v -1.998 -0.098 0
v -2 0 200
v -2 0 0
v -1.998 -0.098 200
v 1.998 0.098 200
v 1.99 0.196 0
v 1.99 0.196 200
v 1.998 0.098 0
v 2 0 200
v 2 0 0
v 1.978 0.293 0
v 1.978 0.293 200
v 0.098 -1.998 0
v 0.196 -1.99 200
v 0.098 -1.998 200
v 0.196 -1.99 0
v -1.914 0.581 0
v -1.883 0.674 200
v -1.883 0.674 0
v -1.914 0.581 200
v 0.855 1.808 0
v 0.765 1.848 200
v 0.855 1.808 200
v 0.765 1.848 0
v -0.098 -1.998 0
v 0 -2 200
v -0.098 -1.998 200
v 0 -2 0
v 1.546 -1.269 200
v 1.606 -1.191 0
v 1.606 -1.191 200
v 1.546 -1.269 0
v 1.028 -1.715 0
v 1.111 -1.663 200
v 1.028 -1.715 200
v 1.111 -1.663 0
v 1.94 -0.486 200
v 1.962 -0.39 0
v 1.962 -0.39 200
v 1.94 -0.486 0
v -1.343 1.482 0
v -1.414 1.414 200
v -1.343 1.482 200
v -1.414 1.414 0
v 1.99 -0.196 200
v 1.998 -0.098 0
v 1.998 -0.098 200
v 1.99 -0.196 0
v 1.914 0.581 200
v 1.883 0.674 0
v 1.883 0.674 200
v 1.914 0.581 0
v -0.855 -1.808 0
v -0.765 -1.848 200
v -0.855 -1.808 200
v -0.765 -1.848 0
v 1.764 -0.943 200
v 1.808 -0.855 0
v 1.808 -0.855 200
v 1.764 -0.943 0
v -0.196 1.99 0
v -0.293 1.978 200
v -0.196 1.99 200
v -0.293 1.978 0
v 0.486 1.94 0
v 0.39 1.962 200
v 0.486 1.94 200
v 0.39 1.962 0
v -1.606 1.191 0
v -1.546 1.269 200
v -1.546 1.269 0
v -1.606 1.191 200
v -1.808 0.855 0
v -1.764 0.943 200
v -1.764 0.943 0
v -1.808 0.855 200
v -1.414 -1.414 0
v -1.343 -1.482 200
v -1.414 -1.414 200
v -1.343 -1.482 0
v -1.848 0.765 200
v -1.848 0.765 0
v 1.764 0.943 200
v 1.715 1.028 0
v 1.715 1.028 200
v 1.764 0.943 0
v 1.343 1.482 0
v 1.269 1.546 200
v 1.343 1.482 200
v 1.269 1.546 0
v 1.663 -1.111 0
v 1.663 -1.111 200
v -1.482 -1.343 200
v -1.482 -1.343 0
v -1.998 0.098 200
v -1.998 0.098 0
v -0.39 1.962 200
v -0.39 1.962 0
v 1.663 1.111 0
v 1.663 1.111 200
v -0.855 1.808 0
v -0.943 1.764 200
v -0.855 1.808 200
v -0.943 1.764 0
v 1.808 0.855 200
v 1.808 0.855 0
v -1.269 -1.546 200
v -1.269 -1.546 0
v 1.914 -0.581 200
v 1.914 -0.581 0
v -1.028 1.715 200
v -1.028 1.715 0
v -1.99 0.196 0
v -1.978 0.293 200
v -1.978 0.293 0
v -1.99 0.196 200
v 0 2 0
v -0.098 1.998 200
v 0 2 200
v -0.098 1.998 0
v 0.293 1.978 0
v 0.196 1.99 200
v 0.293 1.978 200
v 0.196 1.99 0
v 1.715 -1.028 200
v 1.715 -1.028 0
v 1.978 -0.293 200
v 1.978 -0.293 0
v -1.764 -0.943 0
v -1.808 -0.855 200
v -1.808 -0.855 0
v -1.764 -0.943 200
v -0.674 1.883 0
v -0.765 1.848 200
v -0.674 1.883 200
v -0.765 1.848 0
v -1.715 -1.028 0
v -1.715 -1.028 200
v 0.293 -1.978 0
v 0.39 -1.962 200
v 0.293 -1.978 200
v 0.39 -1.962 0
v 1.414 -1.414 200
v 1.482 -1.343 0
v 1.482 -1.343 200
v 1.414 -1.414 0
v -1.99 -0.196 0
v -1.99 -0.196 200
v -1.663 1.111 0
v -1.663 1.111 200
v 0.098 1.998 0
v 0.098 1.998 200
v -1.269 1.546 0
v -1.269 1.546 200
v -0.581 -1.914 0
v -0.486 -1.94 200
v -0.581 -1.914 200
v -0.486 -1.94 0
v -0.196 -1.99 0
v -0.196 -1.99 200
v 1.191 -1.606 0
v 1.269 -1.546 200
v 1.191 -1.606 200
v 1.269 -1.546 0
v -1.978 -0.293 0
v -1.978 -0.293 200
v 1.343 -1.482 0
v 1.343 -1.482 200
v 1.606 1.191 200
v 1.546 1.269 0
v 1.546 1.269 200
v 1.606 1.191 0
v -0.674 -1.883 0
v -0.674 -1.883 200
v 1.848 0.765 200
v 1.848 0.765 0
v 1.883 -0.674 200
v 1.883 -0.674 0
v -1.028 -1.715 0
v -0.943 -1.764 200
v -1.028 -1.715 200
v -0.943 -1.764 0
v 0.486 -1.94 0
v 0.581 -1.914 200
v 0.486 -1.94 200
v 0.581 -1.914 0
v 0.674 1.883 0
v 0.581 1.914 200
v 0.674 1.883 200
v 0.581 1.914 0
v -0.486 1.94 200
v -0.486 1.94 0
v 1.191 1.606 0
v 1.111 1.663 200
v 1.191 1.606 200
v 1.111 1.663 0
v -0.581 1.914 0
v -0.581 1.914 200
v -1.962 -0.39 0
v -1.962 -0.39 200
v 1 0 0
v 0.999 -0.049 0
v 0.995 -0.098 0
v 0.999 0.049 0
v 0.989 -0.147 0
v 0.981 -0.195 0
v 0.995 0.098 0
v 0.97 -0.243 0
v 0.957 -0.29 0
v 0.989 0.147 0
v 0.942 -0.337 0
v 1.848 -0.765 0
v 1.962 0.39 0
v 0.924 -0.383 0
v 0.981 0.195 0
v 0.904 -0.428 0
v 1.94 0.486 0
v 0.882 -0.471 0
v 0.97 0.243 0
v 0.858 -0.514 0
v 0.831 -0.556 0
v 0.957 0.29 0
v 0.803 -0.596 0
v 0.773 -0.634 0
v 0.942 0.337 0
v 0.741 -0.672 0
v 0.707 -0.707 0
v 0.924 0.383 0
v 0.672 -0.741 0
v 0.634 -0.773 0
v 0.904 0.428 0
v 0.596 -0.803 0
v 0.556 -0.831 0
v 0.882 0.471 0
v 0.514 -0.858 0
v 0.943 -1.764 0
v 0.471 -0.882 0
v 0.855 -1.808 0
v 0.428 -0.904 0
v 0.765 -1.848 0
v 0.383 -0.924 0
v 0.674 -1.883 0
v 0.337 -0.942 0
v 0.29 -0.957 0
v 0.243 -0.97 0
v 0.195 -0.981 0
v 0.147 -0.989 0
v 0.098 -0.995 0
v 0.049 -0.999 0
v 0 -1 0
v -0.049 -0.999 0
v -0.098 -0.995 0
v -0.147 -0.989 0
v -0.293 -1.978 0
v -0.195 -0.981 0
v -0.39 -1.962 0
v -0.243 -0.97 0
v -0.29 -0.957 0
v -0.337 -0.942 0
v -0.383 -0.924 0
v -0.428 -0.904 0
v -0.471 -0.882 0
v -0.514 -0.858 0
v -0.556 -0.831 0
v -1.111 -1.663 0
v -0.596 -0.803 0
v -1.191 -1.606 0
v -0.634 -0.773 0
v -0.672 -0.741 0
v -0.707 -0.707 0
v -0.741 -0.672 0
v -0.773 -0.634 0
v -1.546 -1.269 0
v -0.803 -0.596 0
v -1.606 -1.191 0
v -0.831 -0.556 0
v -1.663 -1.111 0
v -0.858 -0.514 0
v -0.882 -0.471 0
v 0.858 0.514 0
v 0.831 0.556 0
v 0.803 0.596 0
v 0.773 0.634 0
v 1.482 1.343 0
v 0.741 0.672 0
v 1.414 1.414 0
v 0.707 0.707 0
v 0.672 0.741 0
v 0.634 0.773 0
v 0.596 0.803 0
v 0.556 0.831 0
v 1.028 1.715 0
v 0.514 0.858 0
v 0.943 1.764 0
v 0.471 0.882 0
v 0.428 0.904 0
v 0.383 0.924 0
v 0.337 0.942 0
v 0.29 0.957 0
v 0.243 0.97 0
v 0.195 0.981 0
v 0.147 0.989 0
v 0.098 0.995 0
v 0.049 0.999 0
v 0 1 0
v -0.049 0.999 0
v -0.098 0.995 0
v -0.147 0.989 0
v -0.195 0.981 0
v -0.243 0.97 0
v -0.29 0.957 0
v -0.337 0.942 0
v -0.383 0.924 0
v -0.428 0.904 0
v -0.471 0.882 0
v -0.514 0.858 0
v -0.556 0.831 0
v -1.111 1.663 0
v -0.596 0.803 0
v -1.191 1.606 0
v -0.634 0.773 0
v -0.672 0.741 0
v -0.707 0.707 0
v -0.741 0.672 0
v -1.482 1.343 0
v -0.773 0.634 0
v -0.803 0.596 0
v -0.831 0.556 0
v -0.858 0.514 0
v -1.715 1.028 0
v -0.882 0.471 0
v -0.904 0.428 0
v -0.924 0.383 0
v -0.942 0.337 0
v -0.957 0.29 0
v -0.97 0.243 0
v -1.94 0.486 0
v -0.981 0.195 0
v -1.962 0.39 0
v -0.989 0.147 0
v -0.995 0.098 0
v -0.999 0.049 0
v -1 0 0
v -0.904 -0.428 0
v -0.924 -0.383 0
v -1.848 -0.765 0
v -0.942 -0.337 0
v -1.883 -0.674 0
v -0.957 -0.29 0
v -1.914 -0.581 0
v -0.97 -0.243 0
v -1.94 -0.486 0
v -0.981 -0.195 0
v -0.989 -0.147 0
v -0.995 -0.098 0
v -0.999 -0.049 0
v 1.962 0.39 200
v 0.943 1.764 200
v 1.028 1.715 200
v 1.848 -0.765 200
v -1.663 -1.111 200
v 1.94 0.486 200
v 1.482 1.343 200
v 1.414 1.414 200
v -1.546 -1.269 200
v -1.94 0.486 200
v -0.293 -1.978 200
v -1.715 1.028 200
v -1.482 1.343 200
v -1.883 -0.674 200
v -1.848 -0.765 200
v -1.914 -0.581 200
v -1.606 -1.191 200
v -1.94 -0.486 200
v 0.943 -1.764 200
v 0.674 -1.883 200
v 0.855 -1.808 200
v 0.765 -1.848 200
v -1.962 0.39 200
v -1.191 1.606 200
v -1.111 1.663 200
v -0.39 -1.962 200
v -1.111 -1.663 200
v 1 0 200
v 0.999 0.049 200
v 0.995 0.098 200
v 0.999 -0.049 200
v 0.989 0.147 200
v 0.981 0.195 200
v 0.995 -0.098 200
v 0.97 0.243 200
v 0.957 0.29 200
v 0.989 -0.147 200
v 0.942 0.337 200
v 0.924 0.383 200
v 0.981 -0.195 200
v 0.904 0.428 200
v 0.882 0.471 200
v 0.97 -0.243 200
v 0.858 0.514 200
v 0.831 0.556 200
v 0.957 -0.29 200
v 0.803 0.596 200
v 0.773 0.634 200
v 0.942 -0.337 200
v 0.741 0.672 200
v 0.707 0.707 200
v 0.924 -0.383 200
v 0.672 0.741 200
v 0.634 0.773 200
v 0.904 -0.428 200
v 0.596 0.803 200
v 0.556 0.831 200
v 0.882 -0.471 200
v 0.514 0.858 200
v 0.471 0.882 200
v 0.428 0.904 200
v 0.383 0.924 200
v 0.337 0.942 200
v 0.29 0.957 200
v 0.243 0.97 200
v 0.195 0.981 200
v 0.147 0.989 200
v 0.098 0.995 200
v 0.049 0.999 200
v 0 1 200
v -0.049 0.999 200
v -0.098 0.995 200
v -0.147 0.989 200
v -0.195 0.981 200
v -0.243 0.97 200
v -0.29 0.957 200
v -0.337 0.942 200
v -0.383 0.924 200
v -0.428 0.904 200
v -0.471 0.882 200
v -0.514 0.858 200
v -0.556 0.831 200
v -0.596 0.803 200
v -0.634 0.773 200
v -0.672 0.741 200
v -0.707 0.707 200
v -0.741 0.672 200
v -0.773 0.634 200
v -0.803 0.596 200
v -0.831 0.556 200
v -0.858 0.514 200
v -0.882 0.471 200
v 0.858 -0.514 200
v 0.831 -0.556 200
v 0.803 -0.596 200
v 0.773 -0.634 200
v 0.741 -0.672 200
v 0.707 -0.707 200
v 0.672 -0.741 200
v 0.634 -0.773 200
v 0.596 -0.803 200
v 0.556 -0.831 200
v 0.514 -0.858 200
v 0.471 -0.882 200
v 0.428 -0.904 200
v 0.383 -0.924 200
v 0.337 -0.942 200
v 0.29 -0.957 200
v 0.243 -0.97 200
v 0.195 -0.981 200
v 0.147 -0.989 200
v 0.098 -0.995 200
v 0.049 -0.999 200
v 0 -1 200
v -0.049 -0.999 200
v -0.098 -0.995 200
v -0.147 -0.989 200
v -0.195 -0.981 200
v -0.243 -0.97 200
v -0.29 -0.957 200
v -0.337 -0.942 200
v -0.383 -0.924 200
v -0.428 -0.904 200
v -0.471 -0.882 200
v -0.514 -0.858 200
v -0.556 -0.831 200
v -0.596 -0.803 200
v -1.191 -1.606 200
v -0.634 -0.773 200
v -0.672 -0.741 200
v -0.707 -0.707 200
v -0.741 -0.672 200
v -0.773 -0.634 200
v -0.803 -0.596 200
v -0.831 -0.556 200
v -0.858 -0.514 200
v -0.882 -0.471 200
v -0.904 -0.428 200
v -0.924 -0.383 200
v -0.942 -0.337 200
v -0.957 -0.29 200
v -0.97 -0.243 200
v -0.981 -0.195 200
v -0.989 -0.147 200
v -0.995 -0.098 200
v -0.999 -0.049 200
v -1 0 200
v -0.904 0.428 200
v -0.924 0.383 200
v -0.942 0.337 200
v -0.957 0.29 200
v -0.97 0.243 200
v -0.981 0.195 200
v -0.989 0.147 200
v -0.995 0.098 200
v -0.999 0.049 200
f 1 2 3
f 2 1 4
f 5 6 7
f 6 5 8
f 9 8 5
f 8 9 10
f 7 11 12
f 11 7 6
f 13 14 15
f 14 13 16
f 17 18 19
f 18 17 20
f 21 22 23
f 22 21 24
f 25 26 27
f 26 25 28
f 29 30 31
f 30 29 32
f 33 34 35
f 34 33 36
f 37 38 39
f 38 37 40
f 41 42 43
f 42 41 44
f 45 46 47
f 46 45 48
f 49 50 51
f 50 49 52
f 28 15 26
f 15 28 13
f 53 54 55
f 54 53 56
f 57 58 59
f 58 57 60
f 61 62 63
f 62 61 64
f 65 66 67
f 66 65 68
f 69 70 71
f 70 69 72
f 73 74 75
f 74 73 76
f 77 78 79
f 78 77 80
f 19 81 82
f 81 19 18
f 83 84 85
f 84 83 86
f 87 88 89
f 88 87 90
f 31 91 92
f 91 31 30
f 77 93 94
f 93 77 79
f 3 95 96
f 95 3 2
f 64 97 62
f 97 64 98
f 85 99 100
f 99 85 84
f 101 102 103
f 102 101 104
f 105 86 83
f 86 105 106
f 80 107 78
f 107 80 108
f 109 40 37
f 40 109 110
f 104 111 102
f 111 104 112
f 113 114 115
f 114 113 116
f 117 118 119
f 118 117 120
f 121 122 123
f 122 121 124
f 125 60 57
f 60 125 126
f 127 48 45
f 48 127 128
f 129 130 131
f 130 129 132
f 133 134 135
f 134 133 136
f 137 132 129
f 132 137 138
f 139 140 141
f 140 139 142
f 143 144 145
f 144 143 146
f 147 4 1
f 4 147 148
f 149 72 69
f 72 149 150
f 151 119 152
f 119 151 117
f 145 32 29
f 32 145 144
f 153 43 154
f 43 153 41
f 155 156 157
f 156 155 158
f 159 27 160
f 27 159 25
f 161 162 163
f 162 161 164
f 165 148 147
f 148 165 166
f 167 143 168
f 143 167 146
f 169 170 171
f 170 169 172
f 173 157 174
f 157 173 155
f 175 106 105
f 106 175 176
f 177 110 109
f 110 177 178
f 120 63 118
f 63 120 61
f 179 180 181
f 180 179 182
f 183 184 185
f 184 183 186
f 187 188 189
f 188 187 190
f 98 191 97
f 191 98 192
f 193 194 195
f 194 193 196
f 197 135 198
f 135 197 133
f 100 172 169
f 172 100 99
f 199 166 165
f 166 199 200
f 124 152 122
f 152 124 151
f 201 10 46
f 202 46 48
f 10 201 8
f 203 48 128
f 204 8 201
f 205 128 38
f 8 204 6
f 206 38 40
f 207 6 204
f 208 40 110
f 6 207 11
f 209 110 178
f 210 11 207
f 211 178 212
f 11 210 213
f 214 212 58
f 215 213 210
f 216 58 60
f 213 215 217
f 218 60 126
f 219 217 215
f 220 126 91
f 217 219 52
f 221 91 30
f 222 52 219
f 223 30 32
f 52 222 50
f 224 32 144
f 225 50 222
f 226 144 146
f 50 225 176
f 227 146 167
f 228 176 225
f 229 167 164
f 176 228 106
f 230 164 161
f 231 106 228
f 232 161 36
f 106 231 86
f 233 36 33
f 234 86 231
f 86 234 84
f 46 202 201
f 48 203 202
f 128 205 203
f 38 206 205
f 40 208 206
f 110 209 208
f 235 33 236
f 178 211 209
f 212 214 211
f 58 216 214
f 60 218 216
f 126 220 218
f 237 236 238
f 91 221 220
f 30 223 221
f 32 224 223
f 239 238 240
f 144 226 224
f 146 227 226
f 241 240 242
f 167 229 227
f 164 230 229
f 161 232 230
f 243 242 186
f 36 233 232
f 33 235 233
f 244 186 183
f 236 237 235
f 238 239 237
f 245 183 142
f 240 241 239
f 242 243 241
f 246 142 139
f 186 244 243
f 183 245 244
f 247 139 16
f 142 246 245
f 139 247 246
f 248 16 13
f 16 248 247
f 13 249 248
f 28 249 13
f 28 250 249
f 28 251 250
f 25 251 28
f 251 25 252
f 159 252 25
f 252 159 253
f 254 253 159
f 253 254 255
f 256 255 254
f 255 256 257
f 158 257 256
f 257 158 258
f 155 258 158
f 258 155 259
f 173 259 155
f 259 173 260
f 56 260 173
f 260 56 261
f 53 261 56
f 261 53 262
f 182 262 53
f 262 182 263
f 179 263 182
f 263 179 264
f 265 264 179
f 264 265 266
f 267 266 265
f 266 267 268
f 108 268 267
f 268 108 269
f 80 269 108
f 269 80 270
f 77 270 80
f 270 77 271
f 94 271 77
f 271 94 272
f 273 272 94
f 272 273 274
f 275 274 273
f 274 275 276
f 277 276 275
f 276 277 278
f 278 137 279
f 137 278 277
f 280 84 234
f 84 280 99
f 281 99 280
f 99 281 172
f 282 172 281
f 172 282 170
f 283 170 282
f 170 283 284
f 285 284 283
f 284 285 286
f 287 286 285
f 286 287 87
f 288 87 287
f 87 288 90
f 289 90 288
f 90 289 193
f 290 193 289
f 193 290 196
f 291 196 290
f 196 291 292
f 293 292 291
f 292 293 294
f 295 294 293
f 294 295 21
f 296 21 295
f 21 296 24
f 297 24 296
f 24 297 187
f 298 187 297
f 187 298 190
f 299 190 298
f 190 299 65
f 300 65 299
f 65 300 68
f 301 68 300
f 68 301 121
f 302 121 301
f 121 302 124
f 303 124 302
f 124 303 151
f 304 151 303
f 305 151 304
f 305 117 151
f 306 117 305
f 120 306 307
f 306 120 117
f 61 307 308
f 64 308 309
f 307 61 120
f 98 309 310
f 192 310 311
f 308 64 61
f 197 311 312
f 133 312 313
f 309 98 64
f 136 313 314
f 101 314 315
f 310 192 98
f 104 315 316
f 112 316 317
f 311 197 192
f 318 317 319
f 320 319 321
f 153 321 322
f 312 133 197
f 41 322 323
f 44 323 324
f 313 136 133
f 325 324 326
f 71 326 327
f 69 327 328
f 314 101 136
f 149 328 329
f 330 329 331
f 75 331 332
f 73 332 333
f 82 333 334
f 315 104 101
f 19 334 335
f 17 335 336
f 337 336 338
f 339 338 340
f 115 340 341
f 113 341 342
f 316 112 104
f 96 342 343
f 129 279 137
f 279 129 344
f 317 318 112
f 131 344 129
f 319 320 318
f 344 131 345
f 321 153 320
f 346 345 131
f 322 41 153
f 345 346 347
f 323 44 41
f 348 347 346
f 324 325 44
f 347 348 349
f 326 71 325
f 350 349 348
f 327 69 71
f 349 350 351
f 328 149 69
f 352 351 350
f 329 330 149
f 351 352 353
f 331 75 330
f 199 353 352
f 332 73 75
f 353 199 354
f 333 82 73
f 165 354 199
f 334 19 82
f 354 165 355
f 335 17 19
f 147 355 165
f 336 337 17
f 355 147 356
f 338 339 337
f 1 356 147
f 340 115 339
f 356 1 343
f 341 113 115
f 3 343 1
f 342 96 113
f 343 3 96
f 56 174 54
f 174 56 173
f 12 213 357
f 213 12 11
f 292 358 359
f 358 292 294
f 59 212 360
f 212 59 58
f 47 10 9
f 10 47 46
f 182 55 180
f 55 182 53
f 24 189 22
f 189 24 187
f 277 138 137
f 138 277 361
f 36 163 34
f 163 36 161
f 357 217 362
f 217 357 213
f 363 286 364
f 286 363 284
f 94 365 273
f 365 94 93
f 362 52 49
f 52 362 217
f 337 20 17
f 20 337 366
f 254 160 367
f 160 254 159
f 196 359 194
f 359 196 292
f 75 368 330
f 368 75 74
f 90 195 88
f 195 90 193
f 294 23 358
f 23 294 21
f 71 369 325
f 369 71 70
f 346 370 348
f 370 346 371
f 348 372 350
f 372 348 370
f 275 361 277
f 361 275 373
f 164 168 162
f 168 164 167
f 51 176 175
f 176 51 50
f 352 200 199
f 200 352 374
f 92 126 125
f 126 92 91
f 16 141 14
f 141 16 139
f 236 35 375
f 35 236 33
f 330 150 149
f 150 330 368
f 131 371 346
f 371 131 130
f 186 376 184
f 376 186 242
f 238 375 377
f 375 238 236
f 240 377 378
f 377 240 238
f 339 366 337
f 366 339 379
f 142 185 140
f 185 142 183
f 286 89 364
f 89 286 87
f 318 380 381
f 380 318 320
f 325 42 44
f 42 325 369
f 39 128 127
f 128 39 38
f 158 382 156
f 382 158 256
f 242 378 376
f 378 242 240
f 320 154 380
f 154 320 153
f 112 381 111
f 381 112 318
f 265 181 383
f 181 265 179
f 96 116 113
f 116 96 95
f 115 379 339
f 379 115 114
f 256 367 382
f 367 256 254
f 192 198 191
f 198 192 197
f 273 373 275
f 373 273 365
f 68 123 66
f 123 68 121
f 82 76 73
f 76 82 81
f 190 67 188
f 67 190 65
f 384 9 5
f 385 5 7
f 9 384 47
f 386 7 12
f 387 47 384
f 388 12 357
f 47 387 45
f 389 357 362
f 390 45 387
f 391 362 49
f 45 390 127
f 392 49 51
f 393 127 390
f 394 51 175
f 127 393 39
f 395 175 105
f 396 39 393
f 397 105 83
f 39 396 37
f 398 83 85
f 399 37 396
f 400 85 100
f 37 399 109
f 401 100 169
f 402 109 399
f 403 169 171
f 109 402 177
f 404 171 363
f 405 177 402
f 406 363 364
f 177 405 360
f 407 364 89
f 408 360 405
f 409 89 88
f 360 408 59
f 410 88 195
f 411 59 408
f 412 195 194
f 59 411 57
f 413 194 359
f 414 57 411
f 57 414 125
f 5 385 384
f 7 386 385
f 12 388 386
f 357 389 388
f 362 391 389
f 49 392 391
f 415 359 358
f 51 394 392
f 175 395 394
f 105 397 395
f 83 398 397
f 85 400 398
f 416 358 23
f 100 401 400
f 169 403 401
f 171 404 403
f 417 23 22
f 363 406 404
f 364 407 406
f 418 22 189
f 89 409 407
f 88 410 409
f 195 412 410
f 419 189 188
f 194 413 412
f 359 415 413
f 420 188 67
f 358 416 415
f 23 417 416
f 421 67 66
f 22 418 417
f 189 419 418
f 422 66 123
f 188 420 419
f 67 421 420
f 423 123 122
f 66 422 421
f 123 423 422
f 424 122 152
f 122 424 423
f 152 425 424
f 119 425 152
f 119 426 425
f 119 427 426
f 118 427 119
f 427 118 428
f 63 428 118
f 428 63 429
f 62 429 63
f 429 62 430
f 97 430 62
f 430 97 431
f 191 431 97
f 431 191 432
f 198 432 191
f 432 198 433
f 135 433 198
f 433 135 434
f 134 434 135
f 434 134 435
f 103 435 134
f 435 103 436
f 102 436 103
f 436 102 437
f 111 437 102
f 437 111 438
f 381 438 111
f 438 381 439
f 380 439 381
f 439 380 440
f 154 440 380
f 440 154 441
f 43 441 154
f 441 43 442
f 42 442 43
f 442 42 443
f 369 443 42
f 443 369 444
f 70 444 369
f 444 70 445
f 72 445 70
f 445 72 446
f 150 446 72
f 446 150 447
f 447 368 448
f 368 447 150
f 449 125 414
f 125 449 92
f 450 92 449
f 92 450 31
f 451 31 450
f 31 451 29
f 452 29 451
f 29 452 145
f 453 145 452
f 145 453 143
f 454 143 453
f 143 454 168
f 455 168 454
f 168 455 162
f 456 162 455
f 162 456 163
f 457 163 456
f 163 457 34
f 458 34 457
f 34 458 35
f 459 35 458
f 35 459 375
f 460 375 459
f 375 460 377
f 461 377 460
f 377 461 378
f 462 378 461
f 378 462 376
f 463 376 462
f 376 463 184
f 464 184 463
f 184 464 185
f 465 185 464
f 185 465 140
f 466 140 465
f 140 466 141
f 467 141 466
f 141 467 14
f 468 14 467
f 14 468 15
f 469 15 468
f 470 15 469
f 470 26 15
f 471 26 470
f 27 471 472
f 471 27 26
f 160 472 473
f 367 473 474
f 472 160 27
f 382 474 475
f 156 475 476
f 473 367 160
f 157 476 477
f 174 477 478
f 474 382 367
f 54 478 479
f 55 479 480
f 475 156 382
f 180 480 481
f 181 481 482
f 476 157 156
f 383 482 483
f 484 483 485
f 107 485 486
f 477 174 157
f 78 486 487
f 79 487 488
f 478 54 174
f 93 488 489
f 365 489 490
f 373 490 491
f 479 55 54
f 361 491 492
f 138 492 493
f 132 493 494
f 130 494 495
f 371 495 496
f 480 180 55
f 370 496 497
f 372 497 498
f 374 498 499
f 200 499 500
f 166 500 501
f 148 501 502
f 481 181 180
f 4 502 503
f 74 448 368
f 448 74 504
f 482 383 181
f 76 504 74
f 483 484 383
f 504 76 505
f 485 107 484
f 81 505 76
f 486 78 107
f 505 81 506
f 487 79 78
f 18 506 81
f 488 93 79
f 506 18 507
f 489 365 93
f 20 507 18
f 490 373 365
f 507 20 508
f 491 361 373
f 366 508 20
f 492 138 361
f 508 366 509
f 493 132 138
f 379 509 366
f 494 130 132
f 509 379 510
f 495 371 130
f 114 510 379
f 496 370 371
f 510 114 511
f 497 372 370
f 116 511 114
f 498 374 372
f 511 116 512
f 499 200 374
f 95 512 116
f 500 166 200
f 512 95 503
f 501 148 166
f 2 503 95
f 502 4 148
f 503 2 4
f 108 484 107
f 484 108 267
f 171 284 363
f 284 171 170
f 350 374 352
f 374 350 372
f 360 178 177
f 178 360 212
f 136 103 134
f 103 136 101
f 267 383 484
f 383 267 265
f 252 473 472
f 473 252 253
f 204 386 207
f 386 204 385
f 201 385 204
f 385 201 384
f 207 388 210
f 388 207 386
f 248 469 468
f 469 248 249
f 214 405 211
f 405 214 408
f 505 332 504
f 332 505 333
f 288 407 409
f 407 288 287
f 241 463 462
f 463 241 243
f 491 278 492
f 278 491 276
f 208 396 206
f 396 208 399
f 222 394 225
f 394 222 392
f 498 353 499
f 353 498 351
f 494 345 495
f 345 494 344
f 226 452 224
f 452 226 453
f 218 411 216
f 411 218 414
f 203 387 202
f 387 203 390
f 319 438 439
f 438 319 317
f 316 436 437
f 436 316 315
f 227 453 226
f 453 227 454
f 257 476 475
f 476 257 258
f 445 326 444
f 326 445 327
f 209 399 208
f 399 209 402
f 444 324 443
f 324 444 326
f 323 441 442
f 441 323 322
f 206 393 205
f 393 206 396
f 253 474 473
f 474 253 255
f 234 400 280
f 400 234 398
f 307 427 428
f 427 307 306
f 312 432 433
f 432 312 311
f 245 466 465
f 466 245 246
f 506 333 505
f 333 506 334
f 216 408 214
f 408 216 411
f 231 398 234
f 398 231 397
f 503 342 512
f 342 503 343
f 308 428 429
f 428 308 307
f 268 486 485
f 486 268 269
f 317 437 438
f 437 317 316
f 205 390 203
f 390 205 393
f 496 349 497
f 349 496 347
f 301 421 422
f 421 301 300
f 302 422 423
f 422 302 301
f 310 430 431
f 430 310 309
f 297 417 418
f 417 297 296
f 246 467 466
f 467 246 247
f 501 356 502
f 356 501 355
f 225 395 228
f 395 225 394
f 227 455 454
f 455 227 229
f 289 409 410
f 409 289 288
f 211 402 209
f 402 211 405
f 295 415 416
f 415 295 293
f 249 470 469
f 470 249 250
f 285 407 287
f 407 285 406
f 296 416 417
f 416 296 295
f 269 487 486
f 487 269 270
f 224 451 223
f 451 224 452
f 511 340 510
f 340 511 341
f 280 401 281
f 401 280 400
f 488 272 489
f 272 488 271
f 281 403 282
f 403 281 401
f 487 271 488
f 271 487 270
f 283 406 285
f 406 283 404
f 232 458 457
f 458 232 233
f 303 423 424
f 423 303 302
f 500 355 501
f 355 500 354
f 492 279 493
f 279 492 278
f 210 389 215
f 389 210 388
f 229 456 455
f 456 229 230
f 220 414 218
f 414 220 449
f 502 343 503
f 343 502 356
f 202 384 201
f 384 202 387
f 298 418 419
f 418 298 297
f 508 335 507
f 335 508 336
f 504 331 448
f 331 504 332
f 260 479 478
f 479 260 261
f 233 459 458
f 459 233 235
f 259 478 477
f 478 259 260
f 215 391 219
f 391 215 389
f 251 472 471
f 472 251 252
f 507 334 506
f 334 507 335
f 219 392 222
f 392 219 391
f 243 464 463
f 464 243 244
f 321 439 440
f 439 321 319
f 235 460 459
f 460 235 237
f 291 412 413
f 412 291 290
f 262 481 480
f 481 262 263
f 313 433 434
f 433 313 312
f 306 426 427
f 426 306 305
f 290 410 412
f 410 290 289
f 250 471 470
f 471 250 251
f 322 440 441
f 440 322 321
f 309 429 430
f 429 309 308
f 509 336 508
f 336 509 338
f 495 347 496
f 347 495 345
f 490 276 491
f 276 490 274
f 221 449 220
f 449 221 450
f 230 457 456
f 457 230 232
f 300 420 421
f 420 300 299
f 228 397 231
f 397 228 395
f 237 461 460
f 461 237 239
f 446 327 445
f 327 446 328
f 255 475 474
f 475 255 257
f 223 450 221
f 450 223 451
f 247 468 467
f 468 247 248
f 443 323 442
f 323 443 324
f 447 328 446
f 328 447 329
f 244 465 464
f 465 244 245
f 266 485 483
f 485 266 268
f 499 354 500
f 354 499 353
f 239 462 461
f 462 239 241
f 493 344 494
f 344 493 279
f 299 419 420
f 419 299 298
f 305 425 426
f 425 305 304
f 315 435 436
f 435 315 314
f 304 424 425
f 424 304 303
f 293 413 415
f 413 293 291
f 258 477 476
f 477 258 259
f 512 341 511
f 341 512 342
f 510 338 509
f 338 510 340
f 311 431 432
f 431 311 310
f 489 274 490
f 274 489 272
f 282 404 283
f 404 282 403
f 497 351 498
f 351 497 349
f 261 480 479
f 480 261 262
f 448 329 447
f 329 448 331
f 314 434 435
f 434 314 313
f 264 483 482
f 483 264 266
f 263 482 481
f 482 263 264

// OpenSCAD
$fn = 128;

// PTFE tubing parameters (mm)
outer_d = 4.0;     // OD
inner_d = 2.0;     // ID
length  = 200.0;   // tube length

module ptfe_tube(od, id, len) {
    difference() {
        cylinder(h = len, d = od, center = false);
        translate([0,0,-0.1])
            cylinder(h = len + 0.2, d = id, center = false);
    }
}

ptfe_tube(outer_d, inner_d, length);
